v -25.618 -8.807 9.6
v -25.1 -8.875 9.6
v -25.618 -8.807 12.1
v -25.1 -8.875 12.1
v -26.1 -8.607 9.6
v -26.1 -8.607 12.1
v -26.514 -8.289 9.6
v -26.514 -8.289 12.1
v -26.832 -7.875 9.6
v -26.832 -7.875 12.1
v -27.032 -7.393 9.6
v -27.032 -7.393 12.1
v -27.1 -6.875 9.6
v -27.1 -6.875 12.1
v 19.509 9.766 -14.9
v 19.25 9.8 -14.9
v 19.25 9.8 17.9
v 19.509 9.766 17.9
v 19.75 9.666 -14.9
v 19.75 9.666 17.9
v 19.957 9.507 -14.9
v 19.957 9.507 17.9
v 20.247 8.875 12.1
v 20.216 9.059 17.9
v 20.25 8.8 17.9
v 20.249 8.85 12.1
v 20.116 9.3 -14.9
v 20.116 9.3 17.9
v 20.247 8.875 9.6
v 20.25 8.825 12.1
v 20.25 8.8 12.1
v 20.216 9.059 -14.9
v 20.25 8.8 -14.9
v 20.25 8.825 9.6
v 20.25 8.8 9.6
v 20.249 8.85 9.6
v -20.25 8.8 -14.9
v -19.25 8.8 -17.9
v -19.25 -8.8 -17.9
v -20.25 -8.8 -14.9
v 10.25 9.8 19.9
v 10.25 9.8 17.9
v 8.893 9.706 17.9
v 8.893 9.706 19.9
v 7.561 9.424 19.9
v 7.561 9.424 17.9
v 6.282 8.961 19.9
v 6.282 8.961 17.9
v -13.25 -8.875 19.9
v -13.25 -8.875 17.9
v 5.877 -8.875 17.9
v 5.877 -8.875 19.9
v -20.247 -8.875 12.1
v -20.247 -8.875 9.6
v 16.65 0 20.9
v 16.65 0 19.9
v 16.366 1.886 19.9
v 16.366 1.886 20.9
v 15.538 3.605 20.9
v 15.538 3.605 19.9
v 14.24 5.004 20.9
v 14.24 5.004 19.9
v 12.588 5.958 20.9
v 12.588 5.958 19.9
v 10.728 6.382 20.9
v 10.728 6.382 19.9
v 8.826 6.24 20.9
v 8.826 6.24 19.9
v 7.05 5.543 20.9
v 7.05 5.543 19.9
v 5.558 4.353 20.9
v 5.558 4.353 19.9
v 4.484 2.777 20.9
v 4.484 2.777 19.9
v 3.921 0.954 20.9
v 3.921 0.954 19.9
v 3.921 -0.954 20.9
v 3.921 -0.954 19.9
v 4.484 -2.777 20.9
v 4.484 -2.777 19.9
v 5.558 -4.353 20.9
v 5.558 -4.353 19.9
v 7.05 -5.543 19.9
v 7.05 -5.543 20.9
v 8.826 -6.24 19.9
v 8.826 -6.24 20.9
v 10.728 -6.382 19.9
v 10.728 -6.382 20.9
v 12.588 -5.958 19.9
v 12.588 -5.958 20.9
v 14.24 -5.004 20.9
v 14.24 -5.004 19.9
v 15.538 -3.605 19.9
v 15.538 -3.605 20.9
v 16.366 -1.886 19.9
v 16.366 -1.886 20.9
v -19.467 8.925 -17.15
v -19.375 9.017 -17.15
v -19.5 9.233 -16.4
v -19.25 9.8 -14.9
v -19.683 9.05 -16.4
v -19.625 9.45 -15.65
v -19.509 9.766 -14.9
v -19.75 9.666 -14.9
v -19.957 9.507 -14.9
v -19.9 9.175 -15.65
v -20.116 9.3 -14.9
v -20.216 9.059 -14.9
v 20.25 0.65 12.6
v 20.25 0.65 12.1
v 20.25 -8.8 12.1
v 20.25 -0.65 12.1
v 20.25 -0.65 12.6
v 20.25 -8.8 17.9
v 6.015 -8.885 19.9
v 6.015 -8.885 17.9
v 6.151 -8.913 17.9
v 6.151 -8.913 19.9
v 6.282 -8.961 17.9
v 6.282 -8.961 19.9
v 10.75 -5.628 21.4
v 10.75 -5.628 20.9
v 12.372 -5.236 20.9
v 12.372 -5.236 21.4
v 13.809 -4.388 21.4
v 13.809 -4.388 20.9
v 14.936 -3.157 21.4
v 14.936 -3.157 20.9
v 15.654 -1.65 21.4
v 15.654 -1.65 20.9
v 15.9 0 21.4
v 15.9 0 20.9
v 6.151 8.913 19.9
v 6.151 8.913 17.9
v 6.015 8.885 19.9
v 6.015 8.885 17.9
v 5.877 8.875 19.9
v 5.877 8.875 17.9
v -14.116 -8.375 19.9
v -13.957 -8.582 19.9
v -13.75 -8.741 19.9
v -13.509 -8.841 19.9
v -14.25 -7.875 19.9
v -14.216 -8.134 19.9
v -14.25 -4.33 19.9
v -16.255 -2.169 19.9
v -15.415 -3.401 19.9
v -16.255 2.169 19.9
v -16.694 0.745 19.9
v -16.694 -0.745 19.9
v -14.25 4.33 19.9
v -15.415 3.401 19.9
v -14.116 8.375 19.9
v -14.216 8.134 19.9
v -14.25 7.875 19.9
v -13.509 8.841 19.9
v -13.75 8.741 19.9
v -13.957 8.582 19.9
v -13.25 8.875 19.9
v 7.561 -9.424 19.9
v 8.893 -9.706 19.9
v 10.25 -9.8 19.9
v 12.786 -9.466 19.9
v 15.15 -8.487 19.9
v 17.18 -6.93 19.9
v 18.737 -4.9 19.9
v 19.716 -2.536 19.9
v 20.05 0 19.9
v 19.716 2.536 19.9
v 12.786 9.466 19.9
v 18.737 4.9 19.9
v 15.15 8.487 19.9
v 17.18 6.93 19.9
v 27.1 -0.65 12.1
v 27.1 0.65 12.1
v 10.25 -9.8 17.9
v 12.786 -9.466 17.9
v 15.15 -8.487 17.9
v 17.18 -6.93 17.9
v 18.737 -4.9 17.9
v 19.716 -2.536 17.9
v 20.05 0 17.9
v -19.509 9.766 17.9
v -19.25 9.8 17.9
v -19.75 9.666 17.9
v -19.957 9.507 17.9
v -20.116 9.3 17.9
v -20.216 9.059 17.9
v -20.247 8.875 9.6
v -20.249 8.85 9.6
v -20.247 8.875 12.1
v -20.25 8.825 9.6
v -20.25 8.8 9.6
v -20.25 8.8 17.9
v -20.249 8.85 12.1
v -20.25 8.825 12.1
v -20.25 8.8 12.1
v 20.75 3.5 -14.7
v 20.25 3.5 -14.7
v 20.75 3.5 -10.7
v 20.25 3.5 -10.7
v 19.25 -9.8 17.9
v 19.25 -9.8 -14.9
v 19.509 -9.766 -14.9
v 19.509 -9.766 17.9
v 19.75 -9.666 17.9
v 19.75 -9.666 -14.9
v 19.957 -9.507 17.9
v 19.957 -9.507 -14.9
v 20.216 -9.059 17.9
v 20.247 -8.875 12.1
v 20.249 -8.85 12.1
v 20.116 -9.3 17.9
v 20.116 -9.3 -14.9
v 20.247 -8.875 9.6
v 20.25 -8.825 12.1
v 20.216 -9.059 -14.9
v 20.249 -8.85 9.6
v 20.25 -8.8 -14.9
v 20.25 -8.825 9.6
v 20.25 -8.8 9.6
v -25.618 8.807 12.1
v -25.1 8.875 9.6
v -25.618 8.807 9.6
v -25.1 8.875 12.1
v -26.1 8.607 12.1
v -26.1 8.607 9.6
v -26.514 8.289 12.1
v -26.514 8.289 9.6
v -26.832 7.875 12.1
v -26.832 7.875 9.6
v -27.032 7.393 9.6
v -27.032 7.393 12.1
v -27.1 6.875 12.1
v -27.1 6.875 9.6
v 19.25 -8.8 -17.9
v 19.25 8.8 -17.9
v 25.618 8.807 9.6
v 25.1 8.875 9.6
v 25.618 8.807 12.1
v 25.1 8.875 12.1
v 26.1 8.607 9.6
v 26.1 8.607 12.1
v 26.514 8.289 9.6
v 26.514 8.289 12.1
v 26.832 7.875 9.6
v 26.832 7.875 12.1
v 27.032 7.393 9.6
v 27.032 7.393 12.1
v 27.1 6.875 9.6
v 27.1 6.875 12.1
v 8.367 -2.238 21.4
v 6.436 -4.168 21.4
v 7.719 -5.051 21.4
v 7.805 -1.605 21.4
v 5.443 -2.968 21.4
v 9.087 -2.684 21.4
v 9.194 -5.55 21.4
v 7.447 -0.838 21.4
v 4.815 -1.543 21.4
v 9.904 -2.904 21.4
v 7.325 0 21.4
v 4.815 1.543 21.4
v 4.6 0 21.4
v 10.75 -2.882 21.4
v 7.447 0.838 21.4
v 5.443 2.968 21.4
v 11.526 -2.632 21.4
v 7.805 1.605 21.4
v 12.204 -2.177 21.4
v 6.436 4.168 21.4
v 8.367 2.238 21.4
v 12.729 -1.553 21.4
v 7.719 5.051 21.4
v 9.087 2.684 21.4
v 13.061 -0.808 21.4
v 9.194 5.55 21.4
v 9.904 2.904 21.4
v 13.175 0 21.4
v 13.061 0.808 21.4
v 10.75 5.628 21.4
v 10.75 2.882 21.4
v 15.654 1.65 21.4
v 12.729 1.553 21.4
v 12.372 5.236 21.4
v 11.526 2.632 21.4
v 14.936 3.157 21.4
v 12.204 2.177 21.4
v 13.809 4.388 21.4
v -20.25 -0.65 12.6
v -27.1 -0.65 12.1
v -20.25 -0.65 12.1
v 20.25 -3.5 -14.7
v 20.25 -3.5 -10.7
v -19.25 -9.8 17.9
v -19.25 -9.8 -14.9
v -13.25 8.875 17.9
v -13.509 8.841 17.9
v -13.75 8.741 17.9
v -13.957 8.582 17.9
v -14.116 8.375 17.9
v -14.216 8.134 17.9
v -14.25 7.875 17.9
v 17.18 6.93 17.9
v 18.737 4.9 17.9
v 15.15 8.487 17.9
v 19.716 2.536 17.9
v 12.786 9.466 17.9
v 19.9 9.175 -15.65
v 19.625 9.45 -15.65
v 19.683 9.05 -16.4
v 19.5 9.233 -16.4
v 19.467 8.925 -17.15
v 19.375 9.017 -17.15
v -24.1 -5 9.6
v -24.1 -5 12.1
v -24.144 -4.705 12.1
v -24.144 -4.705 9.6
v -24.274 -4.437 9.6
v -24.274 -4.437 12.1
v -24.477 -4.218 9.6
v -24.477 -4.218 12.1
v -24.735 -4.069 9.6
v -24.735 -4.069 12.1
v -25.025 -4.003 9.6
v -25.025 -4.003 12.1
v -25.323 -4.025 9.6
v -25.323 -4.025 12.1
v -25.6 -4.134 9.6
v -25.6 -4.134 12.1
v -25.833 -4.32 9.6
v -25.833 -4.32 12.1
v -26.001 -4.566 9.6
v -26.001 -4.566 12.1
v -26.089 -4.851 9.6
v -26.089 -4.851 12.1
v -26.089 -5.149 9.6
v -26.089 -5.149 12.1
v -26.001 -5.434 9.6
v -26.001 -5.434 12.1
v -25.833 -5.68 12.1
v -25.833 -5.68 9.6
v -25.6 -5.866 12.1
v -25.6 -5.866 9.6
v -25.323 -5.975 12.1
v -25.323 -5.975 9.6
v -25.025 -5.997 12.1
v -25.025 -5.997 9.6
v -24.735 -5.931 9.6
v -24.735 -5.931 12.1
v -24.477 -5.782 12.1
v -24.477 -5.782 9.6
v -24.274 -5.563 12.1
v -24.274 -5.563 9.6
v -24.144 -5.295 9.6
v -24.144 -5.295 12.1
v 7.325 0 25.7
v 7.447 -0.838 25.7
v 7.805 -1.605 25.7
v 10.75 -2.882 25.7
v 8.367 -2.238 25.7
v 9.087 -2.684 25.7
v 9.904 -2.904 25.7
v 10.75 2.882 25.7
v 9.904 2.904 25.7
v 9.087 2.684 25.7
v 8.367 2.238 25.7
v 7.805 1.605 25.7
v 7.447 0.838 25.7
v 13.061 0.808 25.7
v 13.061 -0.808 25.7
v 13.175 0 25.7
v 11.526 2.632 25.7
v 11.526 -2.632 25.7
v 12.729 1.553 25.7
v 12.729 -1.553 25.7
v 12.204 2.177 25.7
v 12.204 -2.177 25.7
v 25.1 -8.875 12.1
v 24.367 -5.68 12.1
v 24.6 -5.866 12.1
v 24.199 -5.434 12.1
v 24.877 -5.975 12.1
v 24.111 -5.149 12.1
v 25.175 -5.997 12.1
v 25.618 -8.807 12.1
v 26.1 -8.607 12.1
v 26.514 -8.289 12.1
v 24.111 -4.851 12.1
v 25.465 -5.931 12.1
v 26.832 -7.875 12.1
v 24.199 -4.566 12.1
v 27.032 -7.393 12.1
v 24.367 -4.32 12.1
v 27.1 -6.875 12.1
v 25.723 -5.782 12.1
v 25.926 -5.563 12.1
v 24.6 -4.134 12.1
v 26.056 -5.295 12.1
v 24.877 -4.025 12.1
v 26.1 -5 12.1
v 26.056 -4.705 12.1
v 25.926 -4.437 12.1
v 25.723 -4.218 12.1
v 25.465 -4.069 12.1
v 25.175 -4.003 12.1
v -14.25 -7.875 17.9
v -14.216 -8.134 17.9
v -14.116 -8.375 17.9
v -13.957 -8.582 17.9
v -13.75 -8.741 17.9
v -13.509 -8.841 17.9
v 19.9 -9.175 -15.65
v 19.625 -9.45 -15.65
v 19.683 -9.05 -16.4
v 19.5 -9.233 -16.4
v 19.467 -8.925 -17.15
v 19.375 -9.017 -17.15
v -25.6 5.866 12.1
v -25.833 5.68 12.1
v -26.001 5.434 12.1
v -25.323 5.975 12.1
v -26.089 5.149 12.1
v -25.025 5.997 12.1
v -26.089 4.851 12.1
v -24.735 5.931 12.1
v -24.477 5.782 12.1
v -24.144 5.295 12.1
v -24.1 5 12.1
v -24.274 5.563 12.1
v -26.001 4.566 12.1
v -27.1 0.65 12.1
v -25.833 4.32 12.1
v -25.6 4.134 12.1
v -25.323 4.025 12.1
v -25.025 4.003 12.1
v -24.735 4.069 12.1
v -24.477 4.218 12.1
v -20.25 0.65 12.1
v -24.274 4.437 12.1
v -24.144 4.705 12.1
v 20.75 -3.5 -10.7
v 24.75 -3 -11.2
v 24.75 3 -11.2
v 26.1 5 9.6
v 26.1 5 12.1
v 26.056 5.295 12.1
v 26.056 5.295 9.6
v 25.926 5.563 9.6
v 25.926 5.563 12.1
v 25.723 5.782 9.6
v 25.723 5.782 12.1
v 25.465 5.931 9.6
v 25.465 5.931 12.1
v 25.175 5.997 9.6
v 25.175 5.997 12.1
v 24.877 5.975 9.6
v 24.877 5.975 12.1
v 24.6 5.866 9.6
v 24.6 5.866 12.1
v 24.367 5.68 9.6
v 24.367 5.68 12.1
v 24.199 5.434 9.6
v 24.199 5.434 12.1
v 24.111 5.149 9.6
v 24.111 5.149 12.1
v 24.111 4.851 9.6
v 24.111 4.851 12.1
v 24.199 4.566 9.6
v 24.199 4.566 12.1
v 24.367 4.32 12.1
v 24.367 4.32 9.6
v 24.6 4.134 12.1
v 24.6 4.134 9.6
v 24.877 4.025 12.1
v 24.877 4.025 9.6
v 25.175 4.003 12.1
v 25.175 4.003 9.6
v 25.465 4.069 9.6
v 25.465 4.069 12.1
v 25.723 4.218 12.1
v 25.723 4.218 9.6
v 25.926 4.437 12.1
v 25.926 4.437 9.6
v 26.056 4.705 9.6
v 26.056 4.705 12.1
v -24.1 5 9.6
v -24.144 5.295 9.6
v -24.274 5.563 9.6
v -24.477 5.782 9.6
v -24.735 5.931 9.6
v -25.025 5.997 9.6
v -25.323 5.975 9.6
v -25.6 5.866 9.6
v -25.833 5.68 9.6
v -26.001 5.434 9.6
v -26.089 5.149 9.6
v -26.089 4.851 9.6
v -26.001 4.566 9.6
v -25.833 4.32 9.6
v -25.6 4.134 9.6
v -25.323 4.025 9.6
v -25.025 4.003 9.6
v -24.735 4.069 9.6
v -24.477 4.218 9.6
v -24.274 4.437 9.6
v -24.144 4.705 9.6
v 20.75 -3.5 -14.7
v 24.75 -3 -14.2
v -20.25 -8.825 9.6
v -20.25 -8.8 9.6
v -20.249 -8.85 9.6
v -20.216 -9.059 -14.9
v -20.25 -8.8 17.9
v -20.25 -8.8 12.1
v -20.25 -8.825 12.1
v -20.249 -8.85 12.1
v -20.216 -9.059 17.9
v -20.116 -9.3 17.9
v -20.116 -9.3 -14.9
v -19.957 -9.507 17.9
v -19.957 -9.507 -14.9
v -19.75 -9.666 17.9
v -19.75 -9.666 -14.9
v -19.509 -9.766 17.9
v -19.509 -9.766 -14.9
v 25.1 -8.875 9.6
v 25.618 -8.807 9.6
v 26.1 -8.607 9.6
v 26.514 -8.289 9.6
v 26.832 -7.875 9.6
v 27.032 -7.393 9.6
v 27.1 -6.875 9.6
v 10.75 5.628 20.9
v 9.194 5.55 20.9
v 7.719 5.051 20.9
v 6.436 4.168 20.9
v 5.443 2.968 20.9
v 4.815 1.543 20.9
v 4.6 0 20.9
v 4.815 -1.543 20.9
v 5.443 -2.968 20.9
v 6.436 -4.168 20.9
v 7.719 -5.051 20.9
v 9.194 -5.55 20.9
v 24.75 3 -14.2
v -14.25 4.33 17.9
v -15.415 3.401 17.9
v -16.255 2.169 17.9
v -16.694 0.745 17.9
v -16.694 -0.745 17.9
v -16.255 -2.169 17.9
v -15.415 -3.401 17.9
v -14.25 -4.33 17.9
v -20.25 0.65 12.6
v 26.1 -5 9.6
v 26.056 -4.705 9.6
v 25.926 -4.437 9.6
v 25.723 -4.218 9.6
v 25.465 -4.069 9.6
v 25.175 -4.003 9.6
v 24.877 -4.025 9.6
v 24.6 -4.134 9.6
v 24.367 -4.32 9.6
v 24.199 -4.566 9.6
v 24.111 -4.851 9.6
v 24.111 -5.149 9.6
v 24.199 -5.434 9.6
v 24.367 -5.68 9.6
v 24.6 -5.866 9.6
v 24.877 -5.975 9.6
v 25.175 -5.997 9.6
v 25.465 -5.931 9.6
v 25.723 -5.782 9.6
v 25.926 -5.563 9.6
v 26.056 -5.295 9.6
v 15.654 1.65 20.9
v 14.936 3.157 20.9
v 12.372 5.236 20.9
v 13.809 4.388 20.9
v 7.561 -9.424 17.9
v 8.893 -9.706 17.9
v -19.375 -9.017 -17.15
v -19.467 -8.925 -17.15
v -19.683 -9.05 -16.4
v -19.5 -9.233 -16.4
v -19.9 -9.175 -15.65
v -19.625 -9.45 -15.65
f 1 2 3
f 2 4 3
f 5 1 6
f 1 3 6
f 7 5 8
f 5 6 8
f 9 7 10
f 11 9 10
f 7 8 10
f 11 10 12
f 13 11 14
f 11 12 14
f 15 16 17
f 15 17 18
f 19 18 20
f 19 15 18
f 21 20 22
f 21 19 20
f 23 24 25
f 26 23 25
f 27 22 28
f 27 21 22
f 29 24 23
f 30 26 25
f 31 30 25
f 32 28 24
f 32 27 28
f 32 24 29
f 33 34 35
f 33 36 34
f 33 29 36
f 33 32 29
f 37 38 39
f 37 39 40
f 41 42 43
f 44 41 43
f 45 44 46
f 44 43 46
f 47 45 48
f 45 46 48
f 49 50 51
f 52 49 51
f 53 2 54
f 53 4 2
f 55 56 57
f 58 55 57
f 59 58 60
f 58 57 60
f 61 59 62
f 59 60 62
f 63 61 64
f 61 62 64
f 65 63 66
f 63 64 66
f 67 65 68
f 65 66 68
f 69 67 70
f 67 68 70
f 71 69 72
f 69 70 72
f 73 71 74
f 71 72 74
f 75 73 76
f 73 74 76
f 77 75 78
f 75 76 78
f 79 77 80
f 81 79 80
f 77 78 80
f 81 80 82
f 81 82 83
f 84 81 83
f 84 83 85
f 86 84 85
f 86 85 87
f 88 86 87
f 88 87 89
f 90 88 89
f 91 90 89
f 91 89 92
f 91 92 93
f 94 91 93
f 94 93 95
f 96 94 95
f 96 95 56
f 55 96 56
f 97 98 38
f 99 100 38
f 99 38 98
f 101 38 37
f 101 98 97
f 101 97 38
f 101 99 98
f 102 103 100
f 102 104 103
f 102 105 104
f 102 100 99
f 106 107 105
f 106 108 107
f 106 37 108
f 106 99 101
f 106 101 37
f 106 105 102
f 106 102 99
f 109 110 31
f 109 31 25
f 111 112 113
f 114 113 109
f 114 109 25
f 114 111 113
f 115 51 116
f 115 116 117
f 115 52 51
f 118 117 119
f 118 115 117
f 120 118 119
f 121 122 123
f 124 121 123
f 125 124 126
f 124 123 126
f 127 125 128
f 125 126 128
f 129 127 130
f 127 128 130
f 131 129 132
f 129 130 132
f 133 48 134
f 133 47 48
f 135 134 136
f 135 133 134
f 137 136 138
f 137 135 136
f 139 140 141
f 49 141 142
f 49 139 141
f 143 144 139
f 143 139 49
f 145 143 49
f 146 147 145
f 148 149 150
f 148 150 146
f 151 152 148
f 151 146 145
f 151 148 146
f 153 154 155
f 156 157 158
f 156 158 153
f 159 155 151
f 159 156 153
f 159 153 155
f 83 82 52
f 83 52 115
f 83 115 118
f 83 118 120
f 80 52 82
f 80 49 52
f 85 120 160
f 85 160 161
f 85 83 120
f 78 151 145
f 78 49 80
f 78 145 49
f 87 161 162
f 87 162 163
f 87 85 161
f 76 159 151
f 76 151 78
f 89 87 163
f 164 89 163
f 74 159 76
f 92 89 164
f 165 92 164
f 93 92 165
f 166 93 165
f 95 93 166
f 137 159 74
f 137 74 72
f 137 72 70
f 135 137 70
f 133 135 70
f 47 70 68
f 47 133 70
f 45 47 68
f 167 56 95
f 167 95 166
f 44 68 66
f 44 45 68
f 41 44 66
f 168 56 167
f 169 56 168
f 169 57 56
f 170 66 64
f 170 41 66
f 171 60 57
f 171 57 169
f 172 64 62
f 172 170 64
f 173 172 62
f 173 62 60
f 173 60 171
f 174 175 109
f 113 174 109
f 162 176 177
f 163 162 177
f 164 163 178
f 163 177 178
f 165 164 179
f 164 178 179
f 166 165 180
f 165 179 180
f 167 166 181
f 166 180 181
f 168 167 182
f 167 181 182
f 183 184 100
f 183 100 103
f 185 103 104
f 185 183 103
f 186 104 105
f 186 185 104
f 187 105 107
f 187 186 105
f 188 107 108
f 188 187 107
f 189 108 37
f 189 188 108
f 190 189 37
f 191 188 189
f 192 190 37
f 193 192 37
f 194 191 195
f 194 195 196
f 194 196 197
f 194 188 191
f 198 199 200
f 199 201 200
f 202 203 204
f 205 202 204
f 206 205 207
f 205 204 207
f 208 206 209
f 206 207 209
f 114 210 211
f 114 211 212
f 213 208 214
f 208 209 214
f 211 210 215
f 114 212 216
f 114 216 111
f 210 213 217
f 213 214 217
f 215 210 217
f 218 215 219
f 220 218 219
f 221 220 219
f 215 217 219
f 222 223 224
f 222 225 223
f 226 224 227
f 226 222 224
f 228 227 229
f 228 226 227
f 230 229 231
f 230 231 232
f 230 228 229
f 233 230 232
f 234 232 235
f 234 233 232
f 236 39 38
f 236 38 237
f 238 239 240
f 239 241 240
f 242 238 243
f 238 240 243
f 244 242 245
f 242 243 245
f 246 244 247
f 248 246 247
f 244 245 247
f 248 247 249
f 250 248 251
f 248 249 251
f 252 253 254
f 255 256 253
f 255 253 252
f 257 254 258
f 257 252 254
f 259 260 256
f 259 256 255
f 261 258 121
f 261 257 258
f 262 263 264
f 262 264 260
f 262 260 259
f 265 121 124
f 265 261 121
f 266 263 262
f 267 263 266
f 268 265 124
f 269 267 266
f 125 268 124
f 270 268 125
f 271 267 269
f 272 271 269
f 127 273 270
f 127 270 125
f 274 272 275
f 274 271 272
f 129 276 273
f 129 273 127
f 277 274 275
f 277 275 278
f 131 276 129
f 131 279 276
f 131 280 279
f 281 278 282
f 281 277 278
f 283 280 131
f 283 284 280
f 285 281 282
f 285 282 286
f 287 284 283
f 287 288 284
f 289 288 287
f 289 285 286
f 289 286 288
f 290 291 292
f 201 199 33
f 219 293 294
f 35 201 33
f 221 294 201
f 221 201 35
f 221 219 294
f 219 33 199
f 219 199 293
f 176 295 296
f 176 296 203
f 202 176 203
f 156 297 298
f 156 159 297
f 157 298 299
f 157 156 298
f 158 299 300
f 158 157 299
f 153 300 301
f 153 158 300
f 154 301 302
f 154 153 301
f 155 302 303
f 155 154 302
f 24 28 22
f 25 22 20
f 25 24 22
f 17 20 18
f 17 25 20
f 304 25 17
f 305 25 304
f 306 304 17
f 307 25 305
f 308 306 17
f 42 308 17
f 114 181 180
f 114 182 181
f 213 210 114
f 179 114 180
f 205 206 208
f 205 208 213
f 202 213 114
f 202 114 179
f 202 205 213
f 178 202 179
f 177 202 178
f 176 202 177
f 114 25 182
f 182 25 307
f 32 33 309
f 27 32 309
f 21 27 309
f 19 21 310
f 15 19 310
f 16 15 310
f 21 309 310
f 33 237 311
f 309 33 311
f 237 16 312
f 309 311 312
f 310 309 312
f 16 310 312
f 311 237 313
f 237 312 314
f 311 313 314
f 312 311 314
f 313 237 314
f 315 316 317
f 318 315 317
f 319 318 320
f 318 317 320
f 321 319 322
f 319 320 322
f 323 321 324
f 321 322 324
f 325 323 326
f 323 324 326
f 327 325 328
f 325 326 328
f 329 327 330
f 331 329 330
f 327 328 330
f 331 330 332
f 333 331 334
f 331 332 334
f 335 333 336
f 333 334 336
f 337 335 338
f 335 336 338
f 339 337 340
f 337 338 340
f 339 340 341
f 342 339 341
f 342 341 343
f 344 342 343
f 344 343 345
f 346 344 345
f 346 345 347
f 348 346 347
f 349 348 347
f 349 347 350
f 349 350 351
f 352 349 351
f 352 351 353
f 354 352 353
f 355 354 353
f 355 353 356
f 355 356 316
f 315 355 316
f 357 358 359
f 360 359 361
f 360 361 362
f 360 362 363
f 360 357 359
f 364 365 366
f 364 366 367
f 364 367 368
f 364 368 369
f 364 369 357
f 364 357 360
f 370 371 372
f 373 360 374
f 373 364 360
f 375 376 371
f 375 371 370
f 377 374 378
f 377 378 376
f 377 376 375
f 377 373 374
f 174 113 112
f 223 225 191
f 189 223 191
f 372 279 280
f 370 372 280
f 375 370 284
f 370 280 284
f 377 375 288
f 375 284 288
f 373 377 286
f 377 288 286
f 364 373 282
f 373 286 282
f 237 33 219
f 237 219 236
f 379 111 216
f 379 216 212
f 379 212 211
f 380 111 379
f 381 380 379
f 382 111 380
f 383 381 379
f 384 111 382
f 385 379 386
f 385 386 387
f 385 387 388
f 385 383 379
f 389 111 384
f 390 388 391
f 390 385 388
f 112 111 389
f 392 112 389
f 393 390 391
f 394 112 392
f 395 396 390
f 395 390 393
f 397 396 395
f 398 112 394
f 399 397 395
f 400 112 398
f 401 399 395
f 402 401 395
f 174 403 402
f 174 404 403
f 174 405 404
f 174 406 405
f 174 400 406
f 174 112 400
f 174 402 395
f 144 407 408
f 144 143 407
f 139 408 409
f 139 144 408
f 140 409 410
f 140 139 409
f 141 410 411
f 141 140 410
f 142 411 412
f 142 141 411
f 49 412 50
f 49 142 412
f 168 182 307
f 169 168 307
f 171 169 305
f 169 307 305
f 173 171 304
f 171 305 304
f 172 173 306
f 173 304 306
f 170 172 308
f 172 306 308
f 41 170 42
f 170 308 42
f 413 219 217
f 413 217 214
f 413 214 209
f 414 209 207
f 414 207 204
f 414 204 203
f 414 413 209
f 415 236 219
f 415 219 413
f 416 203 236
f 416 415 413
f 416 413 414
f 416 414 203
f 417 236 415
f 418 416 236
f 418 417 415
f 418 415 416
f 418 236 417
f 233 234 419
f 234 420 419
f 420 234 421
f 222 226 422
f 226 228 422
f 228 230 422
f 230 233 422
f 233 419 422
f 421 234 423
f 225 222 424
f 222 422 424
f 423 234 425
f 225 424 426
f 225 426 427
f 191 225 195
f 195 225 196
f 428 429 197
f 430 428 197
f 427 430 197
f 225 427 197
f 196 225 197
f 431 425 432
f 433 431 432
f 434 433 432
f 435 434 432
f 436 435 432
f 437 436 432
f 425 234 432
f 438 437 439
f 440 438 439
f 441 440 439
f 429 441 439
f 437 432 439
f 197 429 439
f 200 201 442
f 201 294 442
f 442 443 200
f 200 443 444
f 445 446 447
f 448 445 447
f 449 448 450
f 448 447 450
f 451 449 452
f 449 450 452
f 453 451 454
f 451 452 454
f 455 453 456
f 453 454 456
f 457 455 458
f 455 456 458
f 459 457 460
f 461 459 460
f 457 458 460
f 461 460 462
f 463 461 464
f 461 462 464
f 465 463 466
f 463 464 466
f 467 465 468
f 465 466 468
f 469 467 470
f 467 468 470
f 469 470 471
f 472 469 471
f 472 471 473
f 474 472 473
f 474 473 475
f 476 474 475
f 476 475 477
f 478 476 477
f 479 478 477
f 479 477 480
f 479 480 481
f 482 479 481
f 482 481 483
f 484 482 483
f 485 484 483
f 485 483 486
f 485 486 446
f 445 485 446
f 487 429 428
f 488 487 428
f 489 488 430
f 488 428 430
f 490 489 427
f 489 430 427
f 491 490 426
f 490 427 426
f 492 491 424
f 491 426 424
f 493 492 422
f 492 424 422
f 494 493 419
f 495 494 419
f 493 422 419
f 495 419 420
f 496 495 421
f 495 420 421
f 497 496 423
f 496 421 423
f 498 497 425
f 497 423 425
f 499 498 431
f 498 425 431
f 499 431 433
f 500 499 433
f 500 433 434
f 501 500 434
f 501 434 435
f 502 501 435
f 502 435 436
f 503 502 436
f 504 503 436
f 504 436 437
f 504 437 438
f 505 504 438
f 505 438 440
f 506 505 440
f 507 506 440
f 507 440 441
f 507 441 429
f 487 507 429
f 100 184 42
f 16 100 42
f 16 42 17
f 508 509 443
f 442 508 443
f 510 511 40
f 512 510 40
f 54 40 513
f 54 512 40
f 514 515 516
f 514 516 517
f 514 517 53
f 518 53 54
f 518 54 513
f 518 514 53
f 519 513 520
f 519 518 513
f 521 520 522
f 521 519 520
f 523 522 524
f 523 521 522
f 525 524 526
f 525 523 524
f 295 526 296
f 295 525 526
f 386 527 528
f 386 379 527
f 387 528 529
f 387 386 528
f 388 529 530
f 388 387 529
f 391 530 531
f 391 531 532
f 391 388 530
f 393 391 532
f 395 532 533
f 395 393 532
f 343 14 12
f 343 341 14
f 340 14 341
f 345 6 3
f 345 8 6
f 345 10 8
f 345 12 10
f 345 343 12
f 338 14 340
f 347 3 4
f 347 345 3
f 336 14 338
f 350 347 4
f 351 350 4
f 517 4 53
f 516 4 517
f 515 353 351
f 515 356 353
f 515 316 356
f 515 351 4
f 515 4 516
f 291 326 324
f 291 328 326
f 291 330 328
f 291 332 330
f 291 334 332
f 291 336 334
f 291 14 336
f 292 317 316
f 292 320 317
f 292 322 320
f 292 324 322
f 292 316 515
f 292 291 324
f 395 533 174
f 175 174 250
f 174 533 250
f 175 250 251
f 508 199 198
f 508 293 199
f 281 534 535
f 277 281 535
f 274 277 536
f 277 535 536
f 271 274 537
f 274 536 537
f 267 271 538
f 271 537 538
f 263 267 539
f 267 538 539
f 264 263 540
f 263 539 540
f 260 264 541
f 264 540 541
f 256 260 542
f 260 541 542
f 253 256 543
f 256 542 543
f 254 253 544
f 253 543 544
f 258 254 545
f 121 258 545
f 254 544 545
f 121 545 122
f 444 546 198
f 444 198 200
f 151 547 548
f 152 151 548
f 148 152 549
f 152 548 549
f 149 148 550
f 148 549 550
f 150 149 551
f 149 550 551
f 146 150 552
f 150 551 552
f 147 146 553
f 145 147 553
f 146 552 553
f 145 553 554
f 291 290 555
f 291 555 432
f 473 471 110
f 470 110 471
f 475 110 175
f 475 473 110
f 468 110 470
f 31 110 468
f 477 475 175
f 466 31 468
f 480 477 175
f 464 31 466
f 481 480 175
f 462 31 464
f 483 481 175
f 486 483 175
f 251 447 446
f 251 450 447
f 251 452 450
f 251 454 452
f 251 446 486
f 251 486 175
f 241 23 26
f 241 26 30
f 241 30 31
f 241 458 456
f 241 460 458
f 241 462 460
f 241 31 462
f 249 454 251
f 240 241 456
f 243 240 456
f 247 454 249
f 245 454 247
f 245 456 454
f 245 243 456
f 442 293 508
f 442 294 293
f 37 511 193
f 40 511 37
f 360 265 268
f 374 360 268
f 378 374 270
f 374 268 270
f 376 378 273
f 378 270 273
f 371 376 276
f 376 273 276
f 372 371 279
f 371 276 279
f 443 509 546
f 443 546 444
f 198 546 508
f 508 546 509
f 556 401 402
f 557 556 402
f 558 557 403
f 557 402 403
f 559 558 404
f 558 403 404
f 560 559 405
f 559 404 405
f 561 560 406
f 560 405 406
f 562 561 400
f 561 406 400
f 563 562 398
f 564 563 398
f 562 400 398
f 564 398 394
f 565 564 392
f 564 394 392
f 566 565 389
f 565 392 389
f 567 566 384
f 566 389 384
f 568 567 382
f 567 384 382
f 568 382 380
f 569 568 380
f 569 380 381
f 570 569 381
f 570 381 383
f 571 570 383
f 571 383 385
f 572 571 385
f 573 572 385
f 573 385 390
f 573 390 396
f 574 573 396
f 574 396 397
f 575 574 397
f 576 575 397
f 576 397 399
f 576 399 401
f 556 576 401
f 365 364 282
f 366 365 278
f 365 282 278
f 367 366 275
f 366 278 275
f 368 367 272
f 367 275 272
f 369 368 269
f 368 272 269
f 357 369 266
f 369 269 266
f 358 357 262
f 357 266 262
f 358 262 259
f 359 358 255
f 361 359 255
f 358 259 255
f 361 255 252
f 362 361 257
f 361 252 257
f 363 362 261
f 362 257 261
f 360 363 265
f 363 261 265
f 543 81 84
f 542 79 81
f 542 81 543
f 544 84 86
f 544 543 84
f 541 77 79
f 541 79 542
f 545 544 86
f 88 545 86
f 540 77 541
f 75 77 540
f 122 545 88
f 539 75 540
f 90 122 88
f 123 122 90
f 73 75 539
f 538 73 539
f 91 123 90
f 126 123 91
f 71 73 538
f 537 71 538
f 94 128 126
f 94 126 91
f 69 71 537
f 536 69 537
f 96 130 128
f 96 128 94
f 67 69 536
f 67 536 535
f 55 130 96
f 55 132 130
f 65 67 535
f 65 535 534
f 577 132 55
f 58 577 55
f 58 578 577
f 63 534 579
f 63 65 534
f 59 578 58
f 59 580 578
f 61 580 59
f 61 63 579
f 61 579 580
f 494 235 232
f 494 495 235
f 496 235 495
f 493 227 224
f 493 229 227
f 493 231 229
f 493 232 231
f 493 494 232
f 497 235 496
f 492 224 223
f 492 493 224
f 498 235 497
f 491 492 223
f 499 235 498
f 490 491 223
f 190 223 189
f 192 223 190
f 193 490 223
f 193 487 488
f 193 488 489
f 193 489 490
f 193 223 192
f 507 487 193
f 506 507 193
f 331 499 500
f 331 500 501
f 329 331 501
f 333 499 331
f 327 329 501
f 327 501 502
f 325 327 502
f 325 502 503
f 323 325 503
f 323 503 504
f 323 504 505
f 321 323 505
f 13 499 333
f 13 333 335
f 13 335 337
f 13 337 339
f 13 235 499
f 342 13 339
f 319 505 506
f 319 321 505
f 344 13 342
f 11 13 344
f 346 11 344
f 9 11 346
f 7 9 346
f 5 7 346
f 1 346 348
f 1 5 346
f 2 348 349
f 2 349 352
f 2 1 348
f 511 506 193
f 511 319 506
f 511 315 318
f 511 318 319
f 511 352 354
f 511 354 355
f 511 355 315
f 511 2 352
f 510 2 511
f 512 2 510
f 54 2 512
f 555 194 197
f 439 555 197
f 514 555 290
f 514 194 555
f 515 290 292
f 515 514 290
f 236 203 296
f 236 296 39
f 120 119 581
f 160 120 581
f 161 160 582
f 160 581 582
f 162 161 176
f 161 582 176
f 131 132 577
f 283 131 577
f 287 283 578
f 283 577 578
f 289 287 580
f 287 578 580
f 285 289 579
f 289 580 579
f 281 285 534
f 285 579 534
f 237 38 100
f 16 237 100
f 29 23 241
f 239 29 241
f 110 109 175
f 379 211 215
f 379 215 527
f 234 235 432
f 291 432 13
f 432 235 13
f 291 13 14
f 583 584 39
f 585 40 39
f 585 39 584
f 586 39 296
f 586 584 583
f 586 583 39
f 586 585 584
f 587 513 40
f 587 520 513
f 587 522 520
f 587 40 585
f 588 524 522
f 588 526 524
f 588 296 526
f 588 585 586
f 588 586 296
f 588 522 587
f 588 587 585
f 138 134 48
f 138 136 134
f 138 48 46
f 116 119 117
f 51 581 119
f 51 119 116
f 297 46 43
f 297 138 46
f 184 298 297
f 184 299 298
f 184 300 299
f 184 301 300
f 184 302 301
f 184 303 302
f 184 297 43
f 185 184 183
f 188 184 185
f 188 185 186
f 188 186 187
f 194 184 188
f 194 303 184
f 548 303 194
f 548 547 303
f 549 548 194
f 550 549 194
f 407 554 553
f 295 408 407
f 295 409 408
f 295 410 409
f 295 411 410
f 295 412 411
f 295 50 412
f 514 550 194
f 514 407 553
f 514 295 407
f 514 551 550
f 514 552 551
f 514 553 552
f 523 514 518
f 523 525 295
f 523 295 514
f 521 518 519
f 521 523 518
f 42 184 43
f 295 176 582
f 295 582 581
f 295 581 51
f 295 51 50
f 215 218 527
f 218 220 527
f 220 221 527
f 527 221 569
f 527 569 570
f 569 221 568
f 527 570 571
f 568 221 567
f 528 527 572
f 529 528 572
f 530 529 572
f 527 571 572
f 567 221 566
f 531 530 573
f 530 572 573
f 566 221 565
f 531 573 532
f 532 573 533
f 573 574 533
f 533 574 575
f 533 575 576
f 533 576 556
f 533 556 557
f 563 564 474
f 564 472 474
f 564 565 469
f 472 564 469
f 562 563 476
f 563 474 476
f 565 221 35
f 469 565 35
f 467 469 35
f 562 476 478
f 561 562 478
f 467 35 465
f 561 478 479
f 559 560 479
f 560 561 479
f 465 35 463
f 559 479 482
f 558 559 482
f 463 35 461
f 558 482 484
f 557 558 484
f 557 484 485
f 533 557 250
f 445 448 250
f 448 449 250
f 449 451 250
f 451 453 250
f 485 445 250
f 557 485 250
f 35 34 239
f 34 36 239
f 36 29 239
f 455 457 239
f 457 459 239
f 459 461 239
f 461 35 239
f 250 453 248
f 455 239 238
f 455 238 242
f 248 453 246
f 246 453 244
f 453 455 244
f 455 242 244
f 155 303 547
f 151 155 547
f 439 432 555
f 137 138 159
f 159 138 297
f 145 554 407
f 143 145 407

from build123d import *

# Parameters (mm, degrees)
F0_W           = 40.5
F0_H           = 2.5
F1_DEPTH       = 9.8
F0_W_2         = 6.85
F2_DEPTH       = 8.875
F0_W_3         = 4.5
F0_H_2         = 4
F3_DEPTH       = 3.5
F4_SIZE2       = 0.5
F4_SIZE        = 4
F6_DEPTH       = 2
F7_DEPTH       = 3
F8_DEPTH       = 3.5
F9_DEPTH       = 7.8
F10_DEPTH      = 0.65
F11_R          = 1
F12_DEPTH      = 5
F13_R          = 2
F14_R          = 1
F15_T4_DEPTH   = 40.8
F15_T10_DEPTH  = 40.8
F15_T16_DEPTH  = 40.8
F15_T23_DEPTH  = 40.8
F15_T29_DEPTH  = 40.8
F15_T35_DEPTH  = 40.8
F15_T41_DEPTH  = 40.8
F15_T47_DEPTH  = 40.8
F15_T54_DEPTH  = 40.8
F15_T60_DEPTH  = 40.8
F15_T66_DEPTH  = 40.8
F15_T72_DEPTH  = 40.8
F15_T78_DEPTH  = 40.8
F15_T85_DEPTH  = 40.8
F15_T91_DEPTH  = 40.8
F15_T97_DEPTH  = 40.8
F15_T103_DEPTH = 40.8
F15_T109_DEPTH = 40.8
F15_T116_DEPTH = 40.8
F15_T122_DEPTH = 40.8
F16_T1_DEPTH   = 38.5
F16_T3_DEPTH   = 17.6
F16_T6_ANGLE   = 90.0000000053
F16_T8_ANGLE   = 90.0000000053
F16_T10_ANGLE  = 90.0000000053
F16_T12_ANGLE  = 90.0000000053


# Not quite as in the source:
# - a fillet or chamfer that OpenCascade refuses, or shapes differently, is made with other operations: its cross-section is extruded or revolved along the edge and cut away or added


with BuildPart() as f1:
    # F0 (on Front) → F1 (new body, symmetric)
    with BuildSketch(Plane.XZ):
        Polygon((20.25, 17.9), (-20.25, 17.9), (-20.25, 12.6), (-20.25, 12.1), (20.25, 12.1), (20.25, 12.6), align=None)
        Polygon((20.25, 9.6), (-20.25, 9.6), (-20.25, -17.9), (20.25, -17.9), (20.25, -14.7), (20.25, -10.7), align=None)
        with Locations((0, 10.85)):
            Rectangle(F0_W, F0_H)
    extrude(amount=F1_DEPTH, both=True)

    # F0 (on Front) → F2 (join, symmetric)
    with BuildSketch(Plane.XZ):
        with Locations((23.675, 10.85)):
            Rectangle(F0_W_2, F0_H)
        with Locations((-23.675, 10.85)):
            Rectangle(F0_W_2, F0_H)
    extrude(amount=F2_DEPTH, both=True)

    # F0 (on Front) → F3 (join, symmetric)
    with BuildSketch(Plane.XZ):
        with Locations((22.5, -12.7)):
            Rectangle(F0_W_3, F0_H_2)
    extrude(amount=F3_DEPTH, both=True)

    # F4
    f4_edges = [f1.edges().sort_by_distance(p)[0] for p in [
        (24.75, 0, -10.7),
        (24.75, 3.5, -12.7),
        (24.75, -3.5, -12.7),
        (24.75, 0, -14.7),
    ]]
    chamfer(f4_edges, length=F4_SIZE, length2=F4_SIZE2)

    # F5 (on face) → F6 (join)
    with BuildSketch(Plane.XY.offset(17.9)):
        with BuildLine():
            ThreePointArc((10.2500000427, -9.8), (17.1796464707, -6.9296464405), (20.05, 0))
            ThreePointArc((20.05, 0), (17.1796464556, 6.9296464556), (10.25, 9.8))
            ThreePointArc((10.25, 9.8), (8.1210331144, 9.5659552581), (6.0937546993, 8.875))
            Line((6.0937546993, 8.875), (10.75, 8.875))
            Line((10.75, 8.875), (10.75, 6.3804388564))
            ThreePointArc((10.75, 6.3804388564), (14.9489360498, 4.3451121965), (16.65, 0))
            ThreePointArc((16.65, 0), (14.9489360498, -4.3451121965), (10.75, -6.3804388564))
            Line((10.75, -6.3804388564), (10.75, -8.875))
            Line((10.75, -8.875), (6.0937546993, -8.875))
            ThreePointArc((6.0937546993, -8.875), (8.1210331353, -9.5659552627), (10.2500000427, -9.8))
        make_face()
        with BuildLine():
            ThreePointArc((16.65, 0), (14.9489360498, 4.3451121965), (10.75, 6.3804388564))
            Line((10.75, 6.3804388564), (10.75, 5.6278326201))
            ThreePointArc((10.75, 5.6278326201), (14.4181830574, 3.8142823702), (15.9, 0))
            ThreePointArc((15.9, 0), (14.4181830574, -3.8142823702), (10.75, -5.6278326201))
            Line((10.75, -5.6278326201), (10.75, -6.3804388564))
            ThreePointArc((10.75, -6.3804388564), (14.9489360498, -4.3451121965), (16.65, 0))
        make_face()
        with BuildLine():
            ThreePointArc((15.9, 0), (14.4181830574, 3.8142823702), (10.75, 5.6278326201))
            Line((10.75, 5.6278326201), (10.75, 2.8819481258))
            ThreePointArc((10.75, 2.8819481258), (12.4880934967, 1.8832319294), (13.175, 0))
            ThreePointArc((13.175, 0), (12.4880934967, -1.8832319294), (10.75, -2.8819481258))
            Line((10.75, -2.8819481258), (10.75, -5.6278326201))
            ThreePointArc((10.75, -5.6278326201), (14.4181830574, -3.8142823702), (15.9, 0))
        make_face()
        with BuildLine():
            Line((10.75, 2.8819481258), (10.75, 5.6278326201))
            ThreePointArc((10.75, 5.6278326201), (4.6, 0), (10.75, -5.6278326201))
            Line((10.75, -5.6278326201), (10.75, -2.8819481258))
            ThreePointArc((10.75, -2.8819481258), (7.325, 0), (10.75, 2.8819481258))
        make_face()
        with BuildLine():
            Line((10.75, -2.8819481258), (10.75, 2.8819481258))
            ThreePointArc((10.75, 2.8819481258), (7.325, 0), (10.75, -2.8819481258))
        make_face()
        with BuildLine():
            ThreePointArc((13.175, 0), (12.4880934967, 1.8832319294), (10.75, 2.8819481258))
            Line((10.75, 2.8819481258), (10.75, -2.8819481258))
            ThreePointArc((10.75, -2.8819481258), (12.4880934967, -1.8832319294), (13.175, 0))
        make_face()
        with BuildLine():
            Line((10.75, 5.6278326201), (10.75, 6.3804388564))
            ThreePointArc((10.75, 6.3804388564), (3.85, 0), (10.75, -6.3804388564))
            Line((10.75, -6.3804388564), (10.75, -5.6278326201))
            ThreePointArc((10.75, -5.6278326201), (4.6, 0), (10.75, 5.6278326201))
        make_face()
        with BuildLine():
            Line((10.75, 8.875), (6.0937546993, 8.875))
            ThreePointArc((6.0937546993, 8.875), (0.45, 0), (6.0937546993, -8.875))
            Line((6.0937546993, -8.875), (10.75, -8.875))
            Line((10.75, -8.875), (10.75, -6.3804388564))
            ThreePointArc((10.75, -6.3804388564), (3.85, 0), (10.75, 6.3804388564))
            Line((10.75, 6.3804388564), (10.75, 8.875))
        make_face()
        with BuildLine():
            ThreePointArc((6.0937546993, -8.875), (0.45, 0), (6.0937546993, 8.875))
            Line((6.0937546993, 8.875), (-14.25, 8.875))
            Line((-14.25, 8.875), (-14.25, 4.3301270189))
            ThreePointArc((-14.25, 4.3301270189), (-9.25, 4.3301270189), (-6.75, 0))
            ThreePointArc((-6.75, 0), (-9.25, -4.3301270189), (-14.25, -4.3301270189))
            Line((-14.25, -4.3301270189), (-14.25, -8.875))
            Line((-14.25, -8.875), (6.0937546993, -8.875))
        make_face()
        with BuildLine():
            ThreePointArc((-6.75, 0), (-9.25, 4.3301270189), (-14.25, 4.3301270189))
            Line((-14.25, 4.3301270189), (-14.25, -4.3301270189))
            ThreePointArc((-14.25, -4.3301270189), (-9.25, -4.3301270189), (-6.75, 0))
        make_face()
        with BuildLine():
            Line((-14.25, -4.3301270189), (-14.25, 4.3301270189))
            ThreePointArc((-14.25, 4.3301270189), (-16.75, 0), (-14.25, -4.3301270189))
        make_face()
    extrude(amount=F6_DEPTH)

    # F5 (on face) → F7 (join)
    with BuildSketch(Plane.XY.offset(17.9)):
        with BuildLine():
            Line((10.75, 2.8819481258), (10.75, 5.6278326201))
            ThreePointArc((10.75, 5.6278326201), (4.6, 0), (10.75, -5.6278326201))
            Line((10.75, -5.6278326201), (10.75, -2.8819481258))
            ThreePointArc((10.75, -2.8819481258), (7.325, 0), (10.75, 2.8819481258))
        make_face()
        with BuildLine():
            Line((10.75, -2.8819481258), (10.75, 2.8819481258))
            ThreePointArc((10.75, 2.8819481258), (7.325, 0), (10.75, -2.8819481258))
        make_face()
        with BuildLine():
            ThreePointArc((13.175, 0), (12.4880934967, 1.8832319294), (10.75, 2.8819481258))
            Line((10.75, 2.8819481258), (10.75, -2.8819481258))
            ThreePointArc((10.75, -2.8819481258), (12.4880934967, -1.8832319294), (13.175, 0))
        make_face()
        with BuildLine():
            ThreePointArc((15.9, 0), (14.4181830574, 3.8142823702), (10.75, 5.6278326201))
            Line((10.75, 5.6278326201), (10.75, 2.8819481258))
            ThreePointArc((10.75, 2.8819481258), (12.4880934967, 1.8832319294), (13.175, 0))
            ThreePointArc((13.175, 0), (12.4880934967, -1.8832319294), (10.75, -2.8819481258))
            Line((10.75, -2.8819481258), (10.75, -5.6278326201))
            ThreePointArc((10.75, -5.6278326201), (14.4181830574, -3.8142823702), (15.9, 0))
        make_face()
        with BuildLine():
            ThreePointArc((16.65, 0), (14.9489360498, 4.3451121965), (10.75, 6.3804388564))
            Line((10.75, 6.3804388564), (10.75, 5.6278326201))
            ThreePointArc((10.75, 5.6278326201), (14.4181830574, 3.8142823702), (15.9, 0))
            ThreePointArc((15.9, 0), (14.4181830574, -3.8142823702), (10.75, -5.6278326201))
            Line((10.75, -5.6278326201), (10.75, -6.3804388564))
            ThreePointArc((10.75, -6.3804388564), (14.9489360498, -4.3451121965), (16.65, 0))
        make_face()
        with BuildLine():
            Line((10.75, 5.6278326201), (10.75, 6.3804388564))
            ThreePointArc((10.75, 6.3804388564), (3.85, 0), (10.75, -6.3804388564))
            Line((10.75, -6.3804388564), (10.75, -5.6278326201))
            ThreePointArc((10.75, -5.6278326201), (4.6, 0), (10.75, 5.6278326201))
        make_face()
    extrude(amount=F7_DEPTH)

    # F5 (on face) → F8 (join)
    with BuildSketch(Plane.XY.offset(17.9)):
        with BuildLine():
            ThreePointArc((13.175, 0), (12.4880934967, 1.8832319294), (10.75, 2.8819481258))
            Line((10.75, 2.8819481258), (10.75, -2.8819481258))
            ThreePointArc((10.75, -2.8819481258), (12.4880934967, -1.8832319294), (13.175, 0))
        make_face()
        with BuildLine():
            Line((10.75, -2.8819481258), (10.75, 2.8819481258))
            ThreePointArc((10.75, 2.8819481258), (7.325, 0), (10.75, -2.8819481258))
        make_face()
        with BuildLine():
            Line((10.75, 2.8819481258), (10.75, 5.6278326201))
            ThreePointArc((10.75, 5.6278326201), (4.6, 0), (10.75, -5.6278326201))
            Line((10.75, -5.6278326201), (10.75, -2.8819481258))
            ThreePointArc((10.75, -2.8819481258), (7.325, 0), (10.75, 2.8819481258))
        make_face()
        with BuildLine():
            ThreePointArc((15.9, 0), (14.4181830574, 3.8142823702), (10.75, 5.6278326201))
            Line((10.75, 5.6278326201), (10.75, 2.8819481258))
            ThreePointArc((10.75, 2.8819481258), (12.4880934967, 1.8832319294), (13.175, 0))
            ThreePointArc((13.175, 0), (12.4880934967, -1.8832319294), (10.75, -2.8819481258))
            Line((10.75, -2.8819481258), (10.75, -5.6278326201))
            ThreePointArc((10.75, -5.6278326201), (14.4181830574, -3.8142823702), (15.9, 0))
        make_face()
    extrude(amount=F8_DEPTH)

    # F5 (on face) → F9 (join)
    with BuildSketch(Plane.XY.offset(17.9)):
        with BuildLine():
            Line((10.75, -2.8819481258), (10.75, 2.8819481258))
            ThreePointArc((10.75, 2.8819481258), (7.325, 0), (10.75, -2.8819481258))
        make_face()
        with BuildLine():
            ThreePointArc((13.175, 0), (12.4880934967, 1.8832319294), (10.75, 2.8819481258))
            Line((10.75, 2.8819481258), (10.75, -2.8819481258))
            ThreePointArc((10.75, -2.8819481258), (12.4880934967, -1.8832319294), (13.175, 0))
        make_face()
    extrude(amount=F9_DEPTH)

    # F0 (on Front) → F10 (join, symmetric)
    with BuildSketch(Plane.XZ):
        Polygon((27.1, 12.1), (20.25, 12.6), (20.25, 12.1), align=None)
        Polygon((-20.25, 12.1), (-20.25, 12.6), (-27.1, 12.1), align=None)
    extrude(amount=F10_DEPTH, both=True)

    # F11 (on face) → F12 (cut)
    with BuildSketch(Plane.XY.offset(12.1)):
        with Locations((-25.1, 5)):
            Circle(F11_R)
        with Locations((-25.1, -5)):
            Circle(F11_R)
        with Locations((25.1, 5)):
            Circle(F11_R)
        with Locations((25.1, -5)):
            Circle(F11_R)
    extrude(amount=-F12_DEPTH, mode=Mode.SUBTRACT)

    # F13
    f13_edges = [f1.edges().sort_by_distance(p)[0] for p in [
        (27.1, -8.875, 10.85),
        (27.1, 8.875, 10.85),
        (-27.1, -8.875, 10.85),
        (-27.1, 8.875, 10.85),
    ]]
    fillet(f13_edges, radius=F13_R)

    # F14
    f14_edges = [f1.edges().sort_by_distance(p)[0] for p in [
        (-14.25, -8.875, 18.9),
        (-14.25, 8.875, 18.9),
        (6.093755, 8.875, 18.9),
        (6.093755, -8.875, 18.9),
    ]]
    fillet(f14_edges, radius=F14_R)

    # F15: fillet of radius 1 on 4 edges, made by hand


with BuildPart() as f15_tool2:
    # F15_s3 → F15_t4 (new body)
    with BuildSketch(Plane.XY.offset(-20.4)):
        with BuildLine():
            ThreePointArc((19.25, -9.8), (19.9571067812, -9.5071067812), (20.25, -8.8))
            Line((20.25, -8.8), (20.25, -9.8))
            Line((20.25, -9.8), (19.25, -9.8))
        make_face()
    extrude(amount=F15_T4_DEPTH)

    split(bisect_by=Plane.XZ.offset(8.875), keep=Keep.TOP)

    split(bisect_by=Plane.XY.offset(9.6), keep=Keep.BOTTOM)


with BuildPart() as f1_1:
    add(f1.part)

    # F15_t1: cut F15_tool2
    add(f15_tool2.part, mode=Mode.SUBTRACT)


with BuildPart() as f15_tool8:
    # F15_s9 → F15_t10 (new body)
    with BuildSketch(Plane.XY.offset(-20.4)):
        with BuildLine():
            ThreePointArc((19.25, -9.8), (19.9571067812, -9.5071067812), (20.25, -8.8))
            Line((20.25, -8.8), (20.25, -9.8))
            Line((20.25, -9.8), (19.25, -9.8))
        make_face()
    extrude(amount=F15_T10_DEPTH)

    split(bisect_by=Plane.XZ.offset(8.875), keep=Keep.BOTTOM)

    split(bisect_by=Plane.XY.offset(9.6), keep=Keep.BOTTOM)


with BuildPart() as f1_2:
    add(f1_1.part)

    # F15_t7: cut F15_tool8
    add(f15_tool8.part, mode=Mode.SUBTRACT)


with BuildPart() as f15_tool14:
    # F15_s15 → F15_t16 (new body)
    with BuildSketch(Plane.XY.offset(-20.4)):
        with BuildLine():
            ThreePointArc((19.25, -9.8), (19.9571067812, -9.5071067812), (20.25, -8.8))
            Line((20.25, -8.8), (20.25, -9.8))
            Line((20.25, -9.8), (19.25, -9.8))
        make_face()
    extrude(amount=F15_T16_DEPTH)

    split(bisect_by=Plane.XY.offset(12.1), keep=Keep.BOTTOM)

    split(bisect_by=Plane.XZ.offset(8.875), keep=Keep.TOP)

    split(bisect_by=Plane.XY.offset(9.6), keep=Keep.TOP)


with BuildPart() as f1_3:
    add(f1_2.part)

    # F15_t13: cut F15_tool14
    add(f15_tool14.part, mode=Mode.SUBTRACT)


with BuildPart() as f15_tool21:
    # F15_s22 → F15_t23 (new body)
    with BuildSketch(Plane.XY.offset(-20.4)):
        with BuildLine():
            ThreePointArc((19.25, -9.8), (19.9571067812, -9.5071067812), (20.25, -8.8))
            Line((20.25, -8.8), (20.25, -9.8))
            Line((20.25, -9.8), (19.25, -9.8))
        make_face()
    extrude(amount=F15_T23_DEPTH)

    split(bisect_by=Plane.XY.offset(12.1), keep=Keep.TOP)

    split(bisect_by=Plane.XZ.offset(8.875), keep=Keep.TOP)


with BuildPart() as f1_4:
    add(f1_3.part)

    # F15_t20: cut F15_tool21
    add(f15_tool21.part, mode=Mode.SUBTRACT)


with BuildPart() as f15_tool27:
    # F15_s28 → F15_t29 (new body)
    with BuildSketch(Plane.XY.offset(-20.4)):
        with BuildLine():
            ThreePointArc((19.25, -9.8), (19.9571067812, -9.5071067812), (20.25, -8.8))
            Line((20.25, -8.8), (20.25, -9.8))
            Line((20.25, -9.8), (19.25, -9.8))
        make_face()
    extrude(amount=F15_T29_DEPTH)

    split(bisect_by=Plane.XY.offset(12.1), keep=Keep.TOP)

    split(bisect_by=Plane.XZ.offset(8.875), keep=Keep.BOTTOM)


with BuildPart() as f1_5:
    add(f1_4.part)

    # F15_t26: cut F15_tool27
    add(f15_tool27.part, mode=Mode.SUBTRACT)


with BuildPart() as f15_tool33:
    # F15_s34 → F15_t35 (new body)
    with BuildSketch(Plane.XY.offset(20.4)):
        with BuildLine():
            ThreePointArc((-20.25, -8.8), (-19.9571067812, -9.5071067812), (-19.25, -9.8))
            Line((-19.25, -9.8), (-20.25, -9.8))
            Line((-20.25, -9.8), (-20.25, -8.8))
        make_face()
    extrude(amount=-F15_T35_DEPTH)

    split(bisect_by=Plane.XZ.offset(8.875), keep=Keep.BOTTOM)

    split(bisect_by=Plane.XY.offset(12.1), keep=Keep.TOP)


with BuildPart() as f1_6:
    add(f1_5.part)

    # F15_t32: cut F15_tool33
    add(f15_tool33.part, mode=Mode.SUBTRACT)


with BuildPart() as f15_tool39:
    # F15_s40 → F15_t41 (new body)
    with BuildSketch(Plane.XY.offset(20.4)):
        with BuildLine():
            ThreePointArc((-20.25, -8.8), (-19.9571067812, -9.5071067812), (-19.25, -9.8))
            Line((-19.25, -9.8), (-20.25, -9.8))
            Line((-20.25, -9.8), (-20.25, -8.8))
        make_face()
    extrude(amount=-F15_T41_DEPTH)

    split(bisect_by=Plane.XZ.offset(8.875), keep=Keep.TOP)

    split(bisect_by=Plane.XY.offset(12.1), keep=Keep.TOP)


with BuildPart() as f1_7:
    add(f1_6.part)

    # F15_t38: cut F15_tool39
    add(f15_tool39.part, mode=Mode.SUBTRACT)


with BuildPart() as f15_tool45:
    # F15_s46 → F15_t47 (new body)
    with BuildSketch(Plane.XY.offset(20.4)):
        with BuildLine():
            ThreePointArc((-20.25, -8.8), (-19.9571067812, -9.5071067812), (-19.25, -9.8))
            Line((-19.25, -9.8), (-20.25, -9.8))
            Line((-20.25, -9.8), (-20.25, -8.8))
        make_face()
    extrude(amount=-F15_T47_DEPTH)

    split(bisect_by=Plane.XZ.offset(8.875), keep=Keep.TOP)

    split(bisect_by=Plane.XY.offset(12.1), keep=Keep.BOTTOM)

    split(bisect_by=Plane.XY.offset(9.6), keep=Keep.TOP)


with BuildPart() as f1_8:
    add(f1_7.part)

    # F15_t44: cut F15_tool45
    add(f15_tool45.part, mode=Mode.SUBTRACT)


with BuildPart() as f15_tool52:
    # F15_s53 → F15_t54 (new body)
    with BuildSketch(Plane.XY.offset(20.4)):
        with BuildLine():
            ThreePointArc((-20.25, -8.8), (-19.9571067812, -9.5071067812), (-19.25, -9.8))
            Line((-19.25, -9.8), (-20.25, -9.8))
            Line((-20.25, -9.8), (-20.25, -8.8))
        make_face()
    extrude(amount=-F15_T54_DEPTH)

    split(bisect_by=Plane.XZ.offset(8.875), keep=Keep.BOTTOM)

    split(bisect_by=Plane.XY.offset(9.6), keep=Keep.BOTTOM)


with BuildPart() as f1_9:
    add(f1_8.part)

    # F15_t51: cut F15_tool52
    add(f15_tool52.part, mode=Mode.SUBTRACT)


with BuildPart() as f15_tool58:
    # F15_s59 → F15_t60 (new body)
    with BuildSketch(Plane.XY.offset(20.4)):
        with BuildLine():
            ThreePointArc((-20.25, -8.8), (-19.9571067812, -9.5071067812), (-19.25, -9.8))
            Line((-19.25, -9.8), (-20.25, -9.8))
            Line((-20.25, -9.8), (-20.25, -8.8))
        make_face()
    extrude(amount=-F15_T60_DEPTH)

    split(bisect_by=Plane.XZ.offset(8.875), keep=Keep.TOP)

    split(bisect_by=Plane.XY.offset(9.6), keep=Keep.BOTTOM)


with BuildPart() as f1_10:
    add(f1_9.part)

    # F15_t57: cut F15_tool58
    add(f15_tool58.part, mode=Mode.SUBTRACT)


with BuildPart() as f15_tool64:
    # F15_s65 → F15_t66 (new body)
    with BuildSketch(Plane.XY.offset(20.4)):
        with BuildLine():
            ThreePointArc((-19.25, 9.8), (-19.9571067812, 9.5071067812), (-20.25, 8.8))
            Line((-20.25, 8.8), (-20.25, 9.8))
            Line((-20.25, 9.8), (-19.25, 9.8))
        make_face()
    extrude(amount=-F15_T66_DEPTH)

    split(bisect_by=Plane.XY.offset(12.1), keep=Keep.TOP)

    split(bisect_by=Plane.XZ.offset(-8.875), keep=Keep.BOTTOM)


with BuildPart() as f1_11:
    add(f1_10.part)

    # F15_t63: cut F15_tool64
    add(f15_tool64.part, mode=Mode.SUBTRACT)


with BuildPart() as f15_tool70:
    # F15_s71 → F15_t72 (new body)
    with BuildSketch(Plane.XY.offset(20.4)):
        with BuildLine():
            ThreePointArc((-19.25, 9.8), (-19.9571067812, 9.5071067812), (-20.25, 8.8))
            Line((-20.25, 8.8), (-20.25, 9.8))
            Line((-20.25, 9.8), (-19.25, 9.8))
        make_face()
    extrude(amount=-F15_T72_DEPTH)

    split(bisect_by=Plane.XY.offset(12.1), keep=Keep.TOP)

    split(bisect_by=Plane.XZ.offset(-8.875), keep=Keep.TOP)


with BuildPart() as f1_12:
    add(f1_11.part)

    # F15_t69: cut F15_tool70
    add(f15_tool70.part, mode=Mode.SUBTRACT)


with BuildPart() as f15_tool76:
    # F15_s77 → F15_t78 (new body)
    with BuildSketch(Plane.XY.offset(20.4)):
        with BuildLine():
            ThreePointArc((-19.25, 9.8), (-19.9571067812, 9.5071067812), (-20.25, 8.8))
            Line((-20.25, 8.8), (-20.25, 9.8))
            Line((-20.25, 9.8), (-19.25, 9.8))
        make_face()
    extrude(amount=-F15_T78_DEPTH)

    split(bisect_by=Plane.XY.offset(12.1), keep=Keep.BOTTOM)

    split(bisect_by=Plane.XZ.offset(-8.875), keep=Keep.BOTTOM)

    split(bisect_by=Plane.XY.offset(9.6), keep=Keep.TOP)


with BuildPart() as f1_13:
    add(f1_12.part)

    # F15_t75: cut F15_tool76
    add(f15_tool76.part, mode=Mode.SUBTRACT)


with BuildPart() as f15_tool83:
    # F15_s84 → F15_t85 (new body)
    with BuildSketch(Plane.XY.offset(20.4)):
        with BuildLine():
            ThreePointArc((-19.25, 9.8), (-19.9571067812, 9.5071067812), (-20.25, 8.8))
            Line((-20.25, 8.8), (-20.25, 9.8))
            Line((-20.25, 9.8), (-19.25, 9.8))
        make_face()
    extrude(amount=-F15_T85_DEPTH)

    split(bisect_by=Plane.XZ.offset(-8.875), keep=Keep.BOTTOM)

    split(bisect_by=Plane.XY.offset(9.6), keep=Keep.BOTTOM)


with BuildPart() as f1_14:
    add(f1_13.part)

    # F15_t82: cut F15_tool83
    add(f15_tool83.part, mode=Mode.SUBTRACT)


with BuildPart() as f15_tool89:
    # F15_s90 → F15_t91 (new body)
    with BuildSketch(Plane.XY.offset(20.4)):
        with BuildLine():
            ThreePointArc((-19.25, 9.8), (-19.9571067812, 9.5071067812), (-20.25, 8.8))
            Line((-20.25, 8.8), (-20.25, 9.8))
            Line((-20.25, 9.8), (-19.25, 9.8))
        make_face()
    extrude(amount=-F15_T91_DEPTH)

    split(bisect_by=Plane.XZ.offset(-8.875), keep=Keep.TOP)

    split(bisect_by=Plane.XY.offset(9.6), keep=Keep.BOTTOM)


with BuildPart() as f1_15:
    add(f1_14.part)

    # F15_t88: cut F15_tool89
    add(f15_tool89.part, mode=Mode.SUBTRACT)


with BuildPart() as f15_tool95:
    # F15_s96 → F15_t97 (new body)
    with BuildSketch(Plane.XY.offset(-20.4)):
        with BuildLine():
            ThreePointArc((19.25, 9.8), (19.9571067812, 9.5071067812), (20.25, 8.8))
            Line((20.25, 8.8), (20.25, 9.8))
            Line((20.25, 9.8), (19.25, 9.8))
        make_face()
    extrude(amount=F15_T97_DEPTH)

    split(bisect_by=Plane.XY.offset(9.6), keep=Keep.BOTTOM)

    split(bisect_by=Plane.XZ.offset(-8.875), keep=Keep.BOTTOM)


with BuildPart() as f1_16:
    add(f1_15.part)

    # F15_t94: cut F15_tool95
    add(f15_tool95.part, mode=Mode.SUBTRACT)


with BuildPart() as f15_tool101:
    # F15_s102 → F15_t103 (new body)
    with BuildSketch(Plane.XY.offset(-20.4)):
        with BuildLine():
            ThreePointArc((19.25, 9.8), (19.9571067812, 9.5071067812), (20.25, 8.8))
            Line((20.25, 8.8), (20.25, 9.8))
            Line((20.25, 9.8), (19.25, 9.8))
        make_face()
    extrude(amount=F15_T103_DEPTH)

    split(bisect_by=Plane.XY.offset(9.6), keep=Keep.BOTTOM)

    split(bisect_by=Plane.XZ.offset(-8.875), keep=Keep.TOP)


with BuildPart() as f1_17:
    add(f1_16.part)

    # F15_t100: cut F15_tool101
    add(f15_tool101.part, mode=Mode.SUBTRACT)


with BuildPart() as f15_tool107:
    # F15_s108 → F15_t109 (new body)
    with BuildSketch(Plane.XY.offset(-20.4)):
        with BuildLine():
            ThreePointArc((19.25, 9.8), (19.9571067812, 9.5071067812), (20.25, 8.8))
            Line((20.25, 8.8), (20.25, 9.8))
            Line((20.25, 9.8), (19.25, 9.8))
        make_face()
    extrude(amount=F15_T109_DEPTH)

    split(bisect_by=Plane.XY.offset(12.1), keep=Keep.BOTTOM)

    split(bisect_by=Plane.XY.offset(9.6), keep=Keep.TOP)

    split(bisect_by=Plane.XZ.offset(-8.875), keep=Keep.BOTTOM)


with BuildPart() as f1_18:
    add(f1_17.part)

    # F15_t106: cut F15_tool107
    add(f15_tool107.part, mode=Mode.SUBTRACT)


with BuildPart() as f15_tool114:
    # F15_s115 → F15_t116 (new body)
    with BuildSketch(Plane.XY.offset(-20.4)):
        with BuildLine():
            ThreePointArc((19.25, 9.8), (19.9571067812, 9.5071067812), (20.25, 8.8))
            Line((20.25, 8.8), (20.25, 9.8))
            Line((20.25, 9.8), (19.25, 9.8))
        make_face()
    extrude(amount=F15_T116_DEPTH)

    split(bisect_by=Plane.XY.offset(12.1), keep=Keep.TOP)

    split(bisect_by=Plane.XZ.offset(-8.875), keep=Keep.BOTTOM)


with BuildPart() as f1_19:
    add(f1_18.part)

    # F15_t113: cut F15_tool114
    add(f15_tool114.part, mode=Mode.SUBTRACT)


with BuildPart() as f15_tool120:
    # F15_s121 → F15_t122 (new body)
    with BuildSketch(Plane.XY.offset(-20.4)):
        with BuildLine():
            ThreePointArc((19.25, 9.8), (19.9571067812, 9.5071067812), (20.25, 8.8))
            Line((20.25, 8.8), (20.25, 9.8))
            Line((20.25, 9.8), (19.25, 9.8))
        make_face()
    extrude(amount=F15_T122_DEPTH)

    split(bisect_by=Plane.XY.offset(12.1), keep=Keep.TOP)

    split(bisect_by=Plane.XZ.offset(-8.875), keep=Keep.TOP)


with BuildPart() as f1_20:
    add(f1_19.part)

    # F15_t119: cut F15_tool120
    add(f15_tool120.part, mode=Mode.SUBTRACT)

    # F16: chamfer of 3 x 1 on 8 edges, made by hand

    # F16_s2 → F16_t1 (cut)
    with BuildSketch(Plane.YZ.offset(-19.25)):
        Polygon((-9.8, -14.9), (-8.8, -17.9), (-9.8, -17.9), align=None)
        Polygon((8.8, -17.9), (9.8, -14.9), (9.8, -17.9), align=None)
    extrude(amount=F16_T1_DEPTH, mode=Mode.SUBTRACT)

    # F16_s4 → F16_t3 (cut)
    with BuildSketch(Plane.XZ.offset(-8.8)):
        Polygon((20.25, -14.9), (19.25, -17.9), (20.25, -17.9), align=None)
        Polygon((-19.25, -17.9), (-20.25, -14.9), (-20.25, -17.9), align=None)
    extrude(amount=F16_T3_DEPTH, mode=Mode.SUBTRACT)

    # F16_s5 → F16_t6 (revolve, cut)
    with BuildSketch(Plane.XZ.offset(-8.8)):
        Polygon((20.25, -14.9), (19.25, -17.9), (20.25, -17.9), align=None)
    revolve(axis=Axis((19.25, 8.8, -17.9), (0, 0, 1)), revolution_arc=F16_T6_ANGLE, mode=Mode.SUBTRACT)

    # F16_s7 → F16_t8 (revolve, cut)
    with BuildSketch(Plane.XZ.offset(8.8)):
        Polygon((20.25, -14.9), (19.25, -17.9), (20.25, -17.9), align=None)
    revolve(axis=Axis((19.25, -8.8, -17.9), (0, 0, -1)), revolution_arc=F16_T8_ANGLE, mode=Mode.SUBTRACT)

    # F16_s9 → F16_t10 (revolve, cut)
    with BuildSketch(Plane.YZ.offset(-19.25)):
        Polygon((8.8, -17.9), (9.8, -14.9), (9.8, -17.9), align=None)
    revolve(axis=Axis((-19.25, 8.8, -17.9), (0, 0, 1)), revolution_arc=F16_T10_ANGLE, mode=Mode.SUBTRACT)

    # F16_s11 → F16_t12 (revolve, cut)
    with BuildSketch(Plane.XZ.offset(8.8)):
        Polygon((-19.25, -17.9), (-20.25, -14.9), (-20.25, -17.9), align=None)
    revolve(axis=Axis((-19.25, -8.8, -17.9), (0, 0, 1)), revolution_arc=F16_T12_ANGLE, mode=Mode.SUBTRACT)


solid = f1_20.part
